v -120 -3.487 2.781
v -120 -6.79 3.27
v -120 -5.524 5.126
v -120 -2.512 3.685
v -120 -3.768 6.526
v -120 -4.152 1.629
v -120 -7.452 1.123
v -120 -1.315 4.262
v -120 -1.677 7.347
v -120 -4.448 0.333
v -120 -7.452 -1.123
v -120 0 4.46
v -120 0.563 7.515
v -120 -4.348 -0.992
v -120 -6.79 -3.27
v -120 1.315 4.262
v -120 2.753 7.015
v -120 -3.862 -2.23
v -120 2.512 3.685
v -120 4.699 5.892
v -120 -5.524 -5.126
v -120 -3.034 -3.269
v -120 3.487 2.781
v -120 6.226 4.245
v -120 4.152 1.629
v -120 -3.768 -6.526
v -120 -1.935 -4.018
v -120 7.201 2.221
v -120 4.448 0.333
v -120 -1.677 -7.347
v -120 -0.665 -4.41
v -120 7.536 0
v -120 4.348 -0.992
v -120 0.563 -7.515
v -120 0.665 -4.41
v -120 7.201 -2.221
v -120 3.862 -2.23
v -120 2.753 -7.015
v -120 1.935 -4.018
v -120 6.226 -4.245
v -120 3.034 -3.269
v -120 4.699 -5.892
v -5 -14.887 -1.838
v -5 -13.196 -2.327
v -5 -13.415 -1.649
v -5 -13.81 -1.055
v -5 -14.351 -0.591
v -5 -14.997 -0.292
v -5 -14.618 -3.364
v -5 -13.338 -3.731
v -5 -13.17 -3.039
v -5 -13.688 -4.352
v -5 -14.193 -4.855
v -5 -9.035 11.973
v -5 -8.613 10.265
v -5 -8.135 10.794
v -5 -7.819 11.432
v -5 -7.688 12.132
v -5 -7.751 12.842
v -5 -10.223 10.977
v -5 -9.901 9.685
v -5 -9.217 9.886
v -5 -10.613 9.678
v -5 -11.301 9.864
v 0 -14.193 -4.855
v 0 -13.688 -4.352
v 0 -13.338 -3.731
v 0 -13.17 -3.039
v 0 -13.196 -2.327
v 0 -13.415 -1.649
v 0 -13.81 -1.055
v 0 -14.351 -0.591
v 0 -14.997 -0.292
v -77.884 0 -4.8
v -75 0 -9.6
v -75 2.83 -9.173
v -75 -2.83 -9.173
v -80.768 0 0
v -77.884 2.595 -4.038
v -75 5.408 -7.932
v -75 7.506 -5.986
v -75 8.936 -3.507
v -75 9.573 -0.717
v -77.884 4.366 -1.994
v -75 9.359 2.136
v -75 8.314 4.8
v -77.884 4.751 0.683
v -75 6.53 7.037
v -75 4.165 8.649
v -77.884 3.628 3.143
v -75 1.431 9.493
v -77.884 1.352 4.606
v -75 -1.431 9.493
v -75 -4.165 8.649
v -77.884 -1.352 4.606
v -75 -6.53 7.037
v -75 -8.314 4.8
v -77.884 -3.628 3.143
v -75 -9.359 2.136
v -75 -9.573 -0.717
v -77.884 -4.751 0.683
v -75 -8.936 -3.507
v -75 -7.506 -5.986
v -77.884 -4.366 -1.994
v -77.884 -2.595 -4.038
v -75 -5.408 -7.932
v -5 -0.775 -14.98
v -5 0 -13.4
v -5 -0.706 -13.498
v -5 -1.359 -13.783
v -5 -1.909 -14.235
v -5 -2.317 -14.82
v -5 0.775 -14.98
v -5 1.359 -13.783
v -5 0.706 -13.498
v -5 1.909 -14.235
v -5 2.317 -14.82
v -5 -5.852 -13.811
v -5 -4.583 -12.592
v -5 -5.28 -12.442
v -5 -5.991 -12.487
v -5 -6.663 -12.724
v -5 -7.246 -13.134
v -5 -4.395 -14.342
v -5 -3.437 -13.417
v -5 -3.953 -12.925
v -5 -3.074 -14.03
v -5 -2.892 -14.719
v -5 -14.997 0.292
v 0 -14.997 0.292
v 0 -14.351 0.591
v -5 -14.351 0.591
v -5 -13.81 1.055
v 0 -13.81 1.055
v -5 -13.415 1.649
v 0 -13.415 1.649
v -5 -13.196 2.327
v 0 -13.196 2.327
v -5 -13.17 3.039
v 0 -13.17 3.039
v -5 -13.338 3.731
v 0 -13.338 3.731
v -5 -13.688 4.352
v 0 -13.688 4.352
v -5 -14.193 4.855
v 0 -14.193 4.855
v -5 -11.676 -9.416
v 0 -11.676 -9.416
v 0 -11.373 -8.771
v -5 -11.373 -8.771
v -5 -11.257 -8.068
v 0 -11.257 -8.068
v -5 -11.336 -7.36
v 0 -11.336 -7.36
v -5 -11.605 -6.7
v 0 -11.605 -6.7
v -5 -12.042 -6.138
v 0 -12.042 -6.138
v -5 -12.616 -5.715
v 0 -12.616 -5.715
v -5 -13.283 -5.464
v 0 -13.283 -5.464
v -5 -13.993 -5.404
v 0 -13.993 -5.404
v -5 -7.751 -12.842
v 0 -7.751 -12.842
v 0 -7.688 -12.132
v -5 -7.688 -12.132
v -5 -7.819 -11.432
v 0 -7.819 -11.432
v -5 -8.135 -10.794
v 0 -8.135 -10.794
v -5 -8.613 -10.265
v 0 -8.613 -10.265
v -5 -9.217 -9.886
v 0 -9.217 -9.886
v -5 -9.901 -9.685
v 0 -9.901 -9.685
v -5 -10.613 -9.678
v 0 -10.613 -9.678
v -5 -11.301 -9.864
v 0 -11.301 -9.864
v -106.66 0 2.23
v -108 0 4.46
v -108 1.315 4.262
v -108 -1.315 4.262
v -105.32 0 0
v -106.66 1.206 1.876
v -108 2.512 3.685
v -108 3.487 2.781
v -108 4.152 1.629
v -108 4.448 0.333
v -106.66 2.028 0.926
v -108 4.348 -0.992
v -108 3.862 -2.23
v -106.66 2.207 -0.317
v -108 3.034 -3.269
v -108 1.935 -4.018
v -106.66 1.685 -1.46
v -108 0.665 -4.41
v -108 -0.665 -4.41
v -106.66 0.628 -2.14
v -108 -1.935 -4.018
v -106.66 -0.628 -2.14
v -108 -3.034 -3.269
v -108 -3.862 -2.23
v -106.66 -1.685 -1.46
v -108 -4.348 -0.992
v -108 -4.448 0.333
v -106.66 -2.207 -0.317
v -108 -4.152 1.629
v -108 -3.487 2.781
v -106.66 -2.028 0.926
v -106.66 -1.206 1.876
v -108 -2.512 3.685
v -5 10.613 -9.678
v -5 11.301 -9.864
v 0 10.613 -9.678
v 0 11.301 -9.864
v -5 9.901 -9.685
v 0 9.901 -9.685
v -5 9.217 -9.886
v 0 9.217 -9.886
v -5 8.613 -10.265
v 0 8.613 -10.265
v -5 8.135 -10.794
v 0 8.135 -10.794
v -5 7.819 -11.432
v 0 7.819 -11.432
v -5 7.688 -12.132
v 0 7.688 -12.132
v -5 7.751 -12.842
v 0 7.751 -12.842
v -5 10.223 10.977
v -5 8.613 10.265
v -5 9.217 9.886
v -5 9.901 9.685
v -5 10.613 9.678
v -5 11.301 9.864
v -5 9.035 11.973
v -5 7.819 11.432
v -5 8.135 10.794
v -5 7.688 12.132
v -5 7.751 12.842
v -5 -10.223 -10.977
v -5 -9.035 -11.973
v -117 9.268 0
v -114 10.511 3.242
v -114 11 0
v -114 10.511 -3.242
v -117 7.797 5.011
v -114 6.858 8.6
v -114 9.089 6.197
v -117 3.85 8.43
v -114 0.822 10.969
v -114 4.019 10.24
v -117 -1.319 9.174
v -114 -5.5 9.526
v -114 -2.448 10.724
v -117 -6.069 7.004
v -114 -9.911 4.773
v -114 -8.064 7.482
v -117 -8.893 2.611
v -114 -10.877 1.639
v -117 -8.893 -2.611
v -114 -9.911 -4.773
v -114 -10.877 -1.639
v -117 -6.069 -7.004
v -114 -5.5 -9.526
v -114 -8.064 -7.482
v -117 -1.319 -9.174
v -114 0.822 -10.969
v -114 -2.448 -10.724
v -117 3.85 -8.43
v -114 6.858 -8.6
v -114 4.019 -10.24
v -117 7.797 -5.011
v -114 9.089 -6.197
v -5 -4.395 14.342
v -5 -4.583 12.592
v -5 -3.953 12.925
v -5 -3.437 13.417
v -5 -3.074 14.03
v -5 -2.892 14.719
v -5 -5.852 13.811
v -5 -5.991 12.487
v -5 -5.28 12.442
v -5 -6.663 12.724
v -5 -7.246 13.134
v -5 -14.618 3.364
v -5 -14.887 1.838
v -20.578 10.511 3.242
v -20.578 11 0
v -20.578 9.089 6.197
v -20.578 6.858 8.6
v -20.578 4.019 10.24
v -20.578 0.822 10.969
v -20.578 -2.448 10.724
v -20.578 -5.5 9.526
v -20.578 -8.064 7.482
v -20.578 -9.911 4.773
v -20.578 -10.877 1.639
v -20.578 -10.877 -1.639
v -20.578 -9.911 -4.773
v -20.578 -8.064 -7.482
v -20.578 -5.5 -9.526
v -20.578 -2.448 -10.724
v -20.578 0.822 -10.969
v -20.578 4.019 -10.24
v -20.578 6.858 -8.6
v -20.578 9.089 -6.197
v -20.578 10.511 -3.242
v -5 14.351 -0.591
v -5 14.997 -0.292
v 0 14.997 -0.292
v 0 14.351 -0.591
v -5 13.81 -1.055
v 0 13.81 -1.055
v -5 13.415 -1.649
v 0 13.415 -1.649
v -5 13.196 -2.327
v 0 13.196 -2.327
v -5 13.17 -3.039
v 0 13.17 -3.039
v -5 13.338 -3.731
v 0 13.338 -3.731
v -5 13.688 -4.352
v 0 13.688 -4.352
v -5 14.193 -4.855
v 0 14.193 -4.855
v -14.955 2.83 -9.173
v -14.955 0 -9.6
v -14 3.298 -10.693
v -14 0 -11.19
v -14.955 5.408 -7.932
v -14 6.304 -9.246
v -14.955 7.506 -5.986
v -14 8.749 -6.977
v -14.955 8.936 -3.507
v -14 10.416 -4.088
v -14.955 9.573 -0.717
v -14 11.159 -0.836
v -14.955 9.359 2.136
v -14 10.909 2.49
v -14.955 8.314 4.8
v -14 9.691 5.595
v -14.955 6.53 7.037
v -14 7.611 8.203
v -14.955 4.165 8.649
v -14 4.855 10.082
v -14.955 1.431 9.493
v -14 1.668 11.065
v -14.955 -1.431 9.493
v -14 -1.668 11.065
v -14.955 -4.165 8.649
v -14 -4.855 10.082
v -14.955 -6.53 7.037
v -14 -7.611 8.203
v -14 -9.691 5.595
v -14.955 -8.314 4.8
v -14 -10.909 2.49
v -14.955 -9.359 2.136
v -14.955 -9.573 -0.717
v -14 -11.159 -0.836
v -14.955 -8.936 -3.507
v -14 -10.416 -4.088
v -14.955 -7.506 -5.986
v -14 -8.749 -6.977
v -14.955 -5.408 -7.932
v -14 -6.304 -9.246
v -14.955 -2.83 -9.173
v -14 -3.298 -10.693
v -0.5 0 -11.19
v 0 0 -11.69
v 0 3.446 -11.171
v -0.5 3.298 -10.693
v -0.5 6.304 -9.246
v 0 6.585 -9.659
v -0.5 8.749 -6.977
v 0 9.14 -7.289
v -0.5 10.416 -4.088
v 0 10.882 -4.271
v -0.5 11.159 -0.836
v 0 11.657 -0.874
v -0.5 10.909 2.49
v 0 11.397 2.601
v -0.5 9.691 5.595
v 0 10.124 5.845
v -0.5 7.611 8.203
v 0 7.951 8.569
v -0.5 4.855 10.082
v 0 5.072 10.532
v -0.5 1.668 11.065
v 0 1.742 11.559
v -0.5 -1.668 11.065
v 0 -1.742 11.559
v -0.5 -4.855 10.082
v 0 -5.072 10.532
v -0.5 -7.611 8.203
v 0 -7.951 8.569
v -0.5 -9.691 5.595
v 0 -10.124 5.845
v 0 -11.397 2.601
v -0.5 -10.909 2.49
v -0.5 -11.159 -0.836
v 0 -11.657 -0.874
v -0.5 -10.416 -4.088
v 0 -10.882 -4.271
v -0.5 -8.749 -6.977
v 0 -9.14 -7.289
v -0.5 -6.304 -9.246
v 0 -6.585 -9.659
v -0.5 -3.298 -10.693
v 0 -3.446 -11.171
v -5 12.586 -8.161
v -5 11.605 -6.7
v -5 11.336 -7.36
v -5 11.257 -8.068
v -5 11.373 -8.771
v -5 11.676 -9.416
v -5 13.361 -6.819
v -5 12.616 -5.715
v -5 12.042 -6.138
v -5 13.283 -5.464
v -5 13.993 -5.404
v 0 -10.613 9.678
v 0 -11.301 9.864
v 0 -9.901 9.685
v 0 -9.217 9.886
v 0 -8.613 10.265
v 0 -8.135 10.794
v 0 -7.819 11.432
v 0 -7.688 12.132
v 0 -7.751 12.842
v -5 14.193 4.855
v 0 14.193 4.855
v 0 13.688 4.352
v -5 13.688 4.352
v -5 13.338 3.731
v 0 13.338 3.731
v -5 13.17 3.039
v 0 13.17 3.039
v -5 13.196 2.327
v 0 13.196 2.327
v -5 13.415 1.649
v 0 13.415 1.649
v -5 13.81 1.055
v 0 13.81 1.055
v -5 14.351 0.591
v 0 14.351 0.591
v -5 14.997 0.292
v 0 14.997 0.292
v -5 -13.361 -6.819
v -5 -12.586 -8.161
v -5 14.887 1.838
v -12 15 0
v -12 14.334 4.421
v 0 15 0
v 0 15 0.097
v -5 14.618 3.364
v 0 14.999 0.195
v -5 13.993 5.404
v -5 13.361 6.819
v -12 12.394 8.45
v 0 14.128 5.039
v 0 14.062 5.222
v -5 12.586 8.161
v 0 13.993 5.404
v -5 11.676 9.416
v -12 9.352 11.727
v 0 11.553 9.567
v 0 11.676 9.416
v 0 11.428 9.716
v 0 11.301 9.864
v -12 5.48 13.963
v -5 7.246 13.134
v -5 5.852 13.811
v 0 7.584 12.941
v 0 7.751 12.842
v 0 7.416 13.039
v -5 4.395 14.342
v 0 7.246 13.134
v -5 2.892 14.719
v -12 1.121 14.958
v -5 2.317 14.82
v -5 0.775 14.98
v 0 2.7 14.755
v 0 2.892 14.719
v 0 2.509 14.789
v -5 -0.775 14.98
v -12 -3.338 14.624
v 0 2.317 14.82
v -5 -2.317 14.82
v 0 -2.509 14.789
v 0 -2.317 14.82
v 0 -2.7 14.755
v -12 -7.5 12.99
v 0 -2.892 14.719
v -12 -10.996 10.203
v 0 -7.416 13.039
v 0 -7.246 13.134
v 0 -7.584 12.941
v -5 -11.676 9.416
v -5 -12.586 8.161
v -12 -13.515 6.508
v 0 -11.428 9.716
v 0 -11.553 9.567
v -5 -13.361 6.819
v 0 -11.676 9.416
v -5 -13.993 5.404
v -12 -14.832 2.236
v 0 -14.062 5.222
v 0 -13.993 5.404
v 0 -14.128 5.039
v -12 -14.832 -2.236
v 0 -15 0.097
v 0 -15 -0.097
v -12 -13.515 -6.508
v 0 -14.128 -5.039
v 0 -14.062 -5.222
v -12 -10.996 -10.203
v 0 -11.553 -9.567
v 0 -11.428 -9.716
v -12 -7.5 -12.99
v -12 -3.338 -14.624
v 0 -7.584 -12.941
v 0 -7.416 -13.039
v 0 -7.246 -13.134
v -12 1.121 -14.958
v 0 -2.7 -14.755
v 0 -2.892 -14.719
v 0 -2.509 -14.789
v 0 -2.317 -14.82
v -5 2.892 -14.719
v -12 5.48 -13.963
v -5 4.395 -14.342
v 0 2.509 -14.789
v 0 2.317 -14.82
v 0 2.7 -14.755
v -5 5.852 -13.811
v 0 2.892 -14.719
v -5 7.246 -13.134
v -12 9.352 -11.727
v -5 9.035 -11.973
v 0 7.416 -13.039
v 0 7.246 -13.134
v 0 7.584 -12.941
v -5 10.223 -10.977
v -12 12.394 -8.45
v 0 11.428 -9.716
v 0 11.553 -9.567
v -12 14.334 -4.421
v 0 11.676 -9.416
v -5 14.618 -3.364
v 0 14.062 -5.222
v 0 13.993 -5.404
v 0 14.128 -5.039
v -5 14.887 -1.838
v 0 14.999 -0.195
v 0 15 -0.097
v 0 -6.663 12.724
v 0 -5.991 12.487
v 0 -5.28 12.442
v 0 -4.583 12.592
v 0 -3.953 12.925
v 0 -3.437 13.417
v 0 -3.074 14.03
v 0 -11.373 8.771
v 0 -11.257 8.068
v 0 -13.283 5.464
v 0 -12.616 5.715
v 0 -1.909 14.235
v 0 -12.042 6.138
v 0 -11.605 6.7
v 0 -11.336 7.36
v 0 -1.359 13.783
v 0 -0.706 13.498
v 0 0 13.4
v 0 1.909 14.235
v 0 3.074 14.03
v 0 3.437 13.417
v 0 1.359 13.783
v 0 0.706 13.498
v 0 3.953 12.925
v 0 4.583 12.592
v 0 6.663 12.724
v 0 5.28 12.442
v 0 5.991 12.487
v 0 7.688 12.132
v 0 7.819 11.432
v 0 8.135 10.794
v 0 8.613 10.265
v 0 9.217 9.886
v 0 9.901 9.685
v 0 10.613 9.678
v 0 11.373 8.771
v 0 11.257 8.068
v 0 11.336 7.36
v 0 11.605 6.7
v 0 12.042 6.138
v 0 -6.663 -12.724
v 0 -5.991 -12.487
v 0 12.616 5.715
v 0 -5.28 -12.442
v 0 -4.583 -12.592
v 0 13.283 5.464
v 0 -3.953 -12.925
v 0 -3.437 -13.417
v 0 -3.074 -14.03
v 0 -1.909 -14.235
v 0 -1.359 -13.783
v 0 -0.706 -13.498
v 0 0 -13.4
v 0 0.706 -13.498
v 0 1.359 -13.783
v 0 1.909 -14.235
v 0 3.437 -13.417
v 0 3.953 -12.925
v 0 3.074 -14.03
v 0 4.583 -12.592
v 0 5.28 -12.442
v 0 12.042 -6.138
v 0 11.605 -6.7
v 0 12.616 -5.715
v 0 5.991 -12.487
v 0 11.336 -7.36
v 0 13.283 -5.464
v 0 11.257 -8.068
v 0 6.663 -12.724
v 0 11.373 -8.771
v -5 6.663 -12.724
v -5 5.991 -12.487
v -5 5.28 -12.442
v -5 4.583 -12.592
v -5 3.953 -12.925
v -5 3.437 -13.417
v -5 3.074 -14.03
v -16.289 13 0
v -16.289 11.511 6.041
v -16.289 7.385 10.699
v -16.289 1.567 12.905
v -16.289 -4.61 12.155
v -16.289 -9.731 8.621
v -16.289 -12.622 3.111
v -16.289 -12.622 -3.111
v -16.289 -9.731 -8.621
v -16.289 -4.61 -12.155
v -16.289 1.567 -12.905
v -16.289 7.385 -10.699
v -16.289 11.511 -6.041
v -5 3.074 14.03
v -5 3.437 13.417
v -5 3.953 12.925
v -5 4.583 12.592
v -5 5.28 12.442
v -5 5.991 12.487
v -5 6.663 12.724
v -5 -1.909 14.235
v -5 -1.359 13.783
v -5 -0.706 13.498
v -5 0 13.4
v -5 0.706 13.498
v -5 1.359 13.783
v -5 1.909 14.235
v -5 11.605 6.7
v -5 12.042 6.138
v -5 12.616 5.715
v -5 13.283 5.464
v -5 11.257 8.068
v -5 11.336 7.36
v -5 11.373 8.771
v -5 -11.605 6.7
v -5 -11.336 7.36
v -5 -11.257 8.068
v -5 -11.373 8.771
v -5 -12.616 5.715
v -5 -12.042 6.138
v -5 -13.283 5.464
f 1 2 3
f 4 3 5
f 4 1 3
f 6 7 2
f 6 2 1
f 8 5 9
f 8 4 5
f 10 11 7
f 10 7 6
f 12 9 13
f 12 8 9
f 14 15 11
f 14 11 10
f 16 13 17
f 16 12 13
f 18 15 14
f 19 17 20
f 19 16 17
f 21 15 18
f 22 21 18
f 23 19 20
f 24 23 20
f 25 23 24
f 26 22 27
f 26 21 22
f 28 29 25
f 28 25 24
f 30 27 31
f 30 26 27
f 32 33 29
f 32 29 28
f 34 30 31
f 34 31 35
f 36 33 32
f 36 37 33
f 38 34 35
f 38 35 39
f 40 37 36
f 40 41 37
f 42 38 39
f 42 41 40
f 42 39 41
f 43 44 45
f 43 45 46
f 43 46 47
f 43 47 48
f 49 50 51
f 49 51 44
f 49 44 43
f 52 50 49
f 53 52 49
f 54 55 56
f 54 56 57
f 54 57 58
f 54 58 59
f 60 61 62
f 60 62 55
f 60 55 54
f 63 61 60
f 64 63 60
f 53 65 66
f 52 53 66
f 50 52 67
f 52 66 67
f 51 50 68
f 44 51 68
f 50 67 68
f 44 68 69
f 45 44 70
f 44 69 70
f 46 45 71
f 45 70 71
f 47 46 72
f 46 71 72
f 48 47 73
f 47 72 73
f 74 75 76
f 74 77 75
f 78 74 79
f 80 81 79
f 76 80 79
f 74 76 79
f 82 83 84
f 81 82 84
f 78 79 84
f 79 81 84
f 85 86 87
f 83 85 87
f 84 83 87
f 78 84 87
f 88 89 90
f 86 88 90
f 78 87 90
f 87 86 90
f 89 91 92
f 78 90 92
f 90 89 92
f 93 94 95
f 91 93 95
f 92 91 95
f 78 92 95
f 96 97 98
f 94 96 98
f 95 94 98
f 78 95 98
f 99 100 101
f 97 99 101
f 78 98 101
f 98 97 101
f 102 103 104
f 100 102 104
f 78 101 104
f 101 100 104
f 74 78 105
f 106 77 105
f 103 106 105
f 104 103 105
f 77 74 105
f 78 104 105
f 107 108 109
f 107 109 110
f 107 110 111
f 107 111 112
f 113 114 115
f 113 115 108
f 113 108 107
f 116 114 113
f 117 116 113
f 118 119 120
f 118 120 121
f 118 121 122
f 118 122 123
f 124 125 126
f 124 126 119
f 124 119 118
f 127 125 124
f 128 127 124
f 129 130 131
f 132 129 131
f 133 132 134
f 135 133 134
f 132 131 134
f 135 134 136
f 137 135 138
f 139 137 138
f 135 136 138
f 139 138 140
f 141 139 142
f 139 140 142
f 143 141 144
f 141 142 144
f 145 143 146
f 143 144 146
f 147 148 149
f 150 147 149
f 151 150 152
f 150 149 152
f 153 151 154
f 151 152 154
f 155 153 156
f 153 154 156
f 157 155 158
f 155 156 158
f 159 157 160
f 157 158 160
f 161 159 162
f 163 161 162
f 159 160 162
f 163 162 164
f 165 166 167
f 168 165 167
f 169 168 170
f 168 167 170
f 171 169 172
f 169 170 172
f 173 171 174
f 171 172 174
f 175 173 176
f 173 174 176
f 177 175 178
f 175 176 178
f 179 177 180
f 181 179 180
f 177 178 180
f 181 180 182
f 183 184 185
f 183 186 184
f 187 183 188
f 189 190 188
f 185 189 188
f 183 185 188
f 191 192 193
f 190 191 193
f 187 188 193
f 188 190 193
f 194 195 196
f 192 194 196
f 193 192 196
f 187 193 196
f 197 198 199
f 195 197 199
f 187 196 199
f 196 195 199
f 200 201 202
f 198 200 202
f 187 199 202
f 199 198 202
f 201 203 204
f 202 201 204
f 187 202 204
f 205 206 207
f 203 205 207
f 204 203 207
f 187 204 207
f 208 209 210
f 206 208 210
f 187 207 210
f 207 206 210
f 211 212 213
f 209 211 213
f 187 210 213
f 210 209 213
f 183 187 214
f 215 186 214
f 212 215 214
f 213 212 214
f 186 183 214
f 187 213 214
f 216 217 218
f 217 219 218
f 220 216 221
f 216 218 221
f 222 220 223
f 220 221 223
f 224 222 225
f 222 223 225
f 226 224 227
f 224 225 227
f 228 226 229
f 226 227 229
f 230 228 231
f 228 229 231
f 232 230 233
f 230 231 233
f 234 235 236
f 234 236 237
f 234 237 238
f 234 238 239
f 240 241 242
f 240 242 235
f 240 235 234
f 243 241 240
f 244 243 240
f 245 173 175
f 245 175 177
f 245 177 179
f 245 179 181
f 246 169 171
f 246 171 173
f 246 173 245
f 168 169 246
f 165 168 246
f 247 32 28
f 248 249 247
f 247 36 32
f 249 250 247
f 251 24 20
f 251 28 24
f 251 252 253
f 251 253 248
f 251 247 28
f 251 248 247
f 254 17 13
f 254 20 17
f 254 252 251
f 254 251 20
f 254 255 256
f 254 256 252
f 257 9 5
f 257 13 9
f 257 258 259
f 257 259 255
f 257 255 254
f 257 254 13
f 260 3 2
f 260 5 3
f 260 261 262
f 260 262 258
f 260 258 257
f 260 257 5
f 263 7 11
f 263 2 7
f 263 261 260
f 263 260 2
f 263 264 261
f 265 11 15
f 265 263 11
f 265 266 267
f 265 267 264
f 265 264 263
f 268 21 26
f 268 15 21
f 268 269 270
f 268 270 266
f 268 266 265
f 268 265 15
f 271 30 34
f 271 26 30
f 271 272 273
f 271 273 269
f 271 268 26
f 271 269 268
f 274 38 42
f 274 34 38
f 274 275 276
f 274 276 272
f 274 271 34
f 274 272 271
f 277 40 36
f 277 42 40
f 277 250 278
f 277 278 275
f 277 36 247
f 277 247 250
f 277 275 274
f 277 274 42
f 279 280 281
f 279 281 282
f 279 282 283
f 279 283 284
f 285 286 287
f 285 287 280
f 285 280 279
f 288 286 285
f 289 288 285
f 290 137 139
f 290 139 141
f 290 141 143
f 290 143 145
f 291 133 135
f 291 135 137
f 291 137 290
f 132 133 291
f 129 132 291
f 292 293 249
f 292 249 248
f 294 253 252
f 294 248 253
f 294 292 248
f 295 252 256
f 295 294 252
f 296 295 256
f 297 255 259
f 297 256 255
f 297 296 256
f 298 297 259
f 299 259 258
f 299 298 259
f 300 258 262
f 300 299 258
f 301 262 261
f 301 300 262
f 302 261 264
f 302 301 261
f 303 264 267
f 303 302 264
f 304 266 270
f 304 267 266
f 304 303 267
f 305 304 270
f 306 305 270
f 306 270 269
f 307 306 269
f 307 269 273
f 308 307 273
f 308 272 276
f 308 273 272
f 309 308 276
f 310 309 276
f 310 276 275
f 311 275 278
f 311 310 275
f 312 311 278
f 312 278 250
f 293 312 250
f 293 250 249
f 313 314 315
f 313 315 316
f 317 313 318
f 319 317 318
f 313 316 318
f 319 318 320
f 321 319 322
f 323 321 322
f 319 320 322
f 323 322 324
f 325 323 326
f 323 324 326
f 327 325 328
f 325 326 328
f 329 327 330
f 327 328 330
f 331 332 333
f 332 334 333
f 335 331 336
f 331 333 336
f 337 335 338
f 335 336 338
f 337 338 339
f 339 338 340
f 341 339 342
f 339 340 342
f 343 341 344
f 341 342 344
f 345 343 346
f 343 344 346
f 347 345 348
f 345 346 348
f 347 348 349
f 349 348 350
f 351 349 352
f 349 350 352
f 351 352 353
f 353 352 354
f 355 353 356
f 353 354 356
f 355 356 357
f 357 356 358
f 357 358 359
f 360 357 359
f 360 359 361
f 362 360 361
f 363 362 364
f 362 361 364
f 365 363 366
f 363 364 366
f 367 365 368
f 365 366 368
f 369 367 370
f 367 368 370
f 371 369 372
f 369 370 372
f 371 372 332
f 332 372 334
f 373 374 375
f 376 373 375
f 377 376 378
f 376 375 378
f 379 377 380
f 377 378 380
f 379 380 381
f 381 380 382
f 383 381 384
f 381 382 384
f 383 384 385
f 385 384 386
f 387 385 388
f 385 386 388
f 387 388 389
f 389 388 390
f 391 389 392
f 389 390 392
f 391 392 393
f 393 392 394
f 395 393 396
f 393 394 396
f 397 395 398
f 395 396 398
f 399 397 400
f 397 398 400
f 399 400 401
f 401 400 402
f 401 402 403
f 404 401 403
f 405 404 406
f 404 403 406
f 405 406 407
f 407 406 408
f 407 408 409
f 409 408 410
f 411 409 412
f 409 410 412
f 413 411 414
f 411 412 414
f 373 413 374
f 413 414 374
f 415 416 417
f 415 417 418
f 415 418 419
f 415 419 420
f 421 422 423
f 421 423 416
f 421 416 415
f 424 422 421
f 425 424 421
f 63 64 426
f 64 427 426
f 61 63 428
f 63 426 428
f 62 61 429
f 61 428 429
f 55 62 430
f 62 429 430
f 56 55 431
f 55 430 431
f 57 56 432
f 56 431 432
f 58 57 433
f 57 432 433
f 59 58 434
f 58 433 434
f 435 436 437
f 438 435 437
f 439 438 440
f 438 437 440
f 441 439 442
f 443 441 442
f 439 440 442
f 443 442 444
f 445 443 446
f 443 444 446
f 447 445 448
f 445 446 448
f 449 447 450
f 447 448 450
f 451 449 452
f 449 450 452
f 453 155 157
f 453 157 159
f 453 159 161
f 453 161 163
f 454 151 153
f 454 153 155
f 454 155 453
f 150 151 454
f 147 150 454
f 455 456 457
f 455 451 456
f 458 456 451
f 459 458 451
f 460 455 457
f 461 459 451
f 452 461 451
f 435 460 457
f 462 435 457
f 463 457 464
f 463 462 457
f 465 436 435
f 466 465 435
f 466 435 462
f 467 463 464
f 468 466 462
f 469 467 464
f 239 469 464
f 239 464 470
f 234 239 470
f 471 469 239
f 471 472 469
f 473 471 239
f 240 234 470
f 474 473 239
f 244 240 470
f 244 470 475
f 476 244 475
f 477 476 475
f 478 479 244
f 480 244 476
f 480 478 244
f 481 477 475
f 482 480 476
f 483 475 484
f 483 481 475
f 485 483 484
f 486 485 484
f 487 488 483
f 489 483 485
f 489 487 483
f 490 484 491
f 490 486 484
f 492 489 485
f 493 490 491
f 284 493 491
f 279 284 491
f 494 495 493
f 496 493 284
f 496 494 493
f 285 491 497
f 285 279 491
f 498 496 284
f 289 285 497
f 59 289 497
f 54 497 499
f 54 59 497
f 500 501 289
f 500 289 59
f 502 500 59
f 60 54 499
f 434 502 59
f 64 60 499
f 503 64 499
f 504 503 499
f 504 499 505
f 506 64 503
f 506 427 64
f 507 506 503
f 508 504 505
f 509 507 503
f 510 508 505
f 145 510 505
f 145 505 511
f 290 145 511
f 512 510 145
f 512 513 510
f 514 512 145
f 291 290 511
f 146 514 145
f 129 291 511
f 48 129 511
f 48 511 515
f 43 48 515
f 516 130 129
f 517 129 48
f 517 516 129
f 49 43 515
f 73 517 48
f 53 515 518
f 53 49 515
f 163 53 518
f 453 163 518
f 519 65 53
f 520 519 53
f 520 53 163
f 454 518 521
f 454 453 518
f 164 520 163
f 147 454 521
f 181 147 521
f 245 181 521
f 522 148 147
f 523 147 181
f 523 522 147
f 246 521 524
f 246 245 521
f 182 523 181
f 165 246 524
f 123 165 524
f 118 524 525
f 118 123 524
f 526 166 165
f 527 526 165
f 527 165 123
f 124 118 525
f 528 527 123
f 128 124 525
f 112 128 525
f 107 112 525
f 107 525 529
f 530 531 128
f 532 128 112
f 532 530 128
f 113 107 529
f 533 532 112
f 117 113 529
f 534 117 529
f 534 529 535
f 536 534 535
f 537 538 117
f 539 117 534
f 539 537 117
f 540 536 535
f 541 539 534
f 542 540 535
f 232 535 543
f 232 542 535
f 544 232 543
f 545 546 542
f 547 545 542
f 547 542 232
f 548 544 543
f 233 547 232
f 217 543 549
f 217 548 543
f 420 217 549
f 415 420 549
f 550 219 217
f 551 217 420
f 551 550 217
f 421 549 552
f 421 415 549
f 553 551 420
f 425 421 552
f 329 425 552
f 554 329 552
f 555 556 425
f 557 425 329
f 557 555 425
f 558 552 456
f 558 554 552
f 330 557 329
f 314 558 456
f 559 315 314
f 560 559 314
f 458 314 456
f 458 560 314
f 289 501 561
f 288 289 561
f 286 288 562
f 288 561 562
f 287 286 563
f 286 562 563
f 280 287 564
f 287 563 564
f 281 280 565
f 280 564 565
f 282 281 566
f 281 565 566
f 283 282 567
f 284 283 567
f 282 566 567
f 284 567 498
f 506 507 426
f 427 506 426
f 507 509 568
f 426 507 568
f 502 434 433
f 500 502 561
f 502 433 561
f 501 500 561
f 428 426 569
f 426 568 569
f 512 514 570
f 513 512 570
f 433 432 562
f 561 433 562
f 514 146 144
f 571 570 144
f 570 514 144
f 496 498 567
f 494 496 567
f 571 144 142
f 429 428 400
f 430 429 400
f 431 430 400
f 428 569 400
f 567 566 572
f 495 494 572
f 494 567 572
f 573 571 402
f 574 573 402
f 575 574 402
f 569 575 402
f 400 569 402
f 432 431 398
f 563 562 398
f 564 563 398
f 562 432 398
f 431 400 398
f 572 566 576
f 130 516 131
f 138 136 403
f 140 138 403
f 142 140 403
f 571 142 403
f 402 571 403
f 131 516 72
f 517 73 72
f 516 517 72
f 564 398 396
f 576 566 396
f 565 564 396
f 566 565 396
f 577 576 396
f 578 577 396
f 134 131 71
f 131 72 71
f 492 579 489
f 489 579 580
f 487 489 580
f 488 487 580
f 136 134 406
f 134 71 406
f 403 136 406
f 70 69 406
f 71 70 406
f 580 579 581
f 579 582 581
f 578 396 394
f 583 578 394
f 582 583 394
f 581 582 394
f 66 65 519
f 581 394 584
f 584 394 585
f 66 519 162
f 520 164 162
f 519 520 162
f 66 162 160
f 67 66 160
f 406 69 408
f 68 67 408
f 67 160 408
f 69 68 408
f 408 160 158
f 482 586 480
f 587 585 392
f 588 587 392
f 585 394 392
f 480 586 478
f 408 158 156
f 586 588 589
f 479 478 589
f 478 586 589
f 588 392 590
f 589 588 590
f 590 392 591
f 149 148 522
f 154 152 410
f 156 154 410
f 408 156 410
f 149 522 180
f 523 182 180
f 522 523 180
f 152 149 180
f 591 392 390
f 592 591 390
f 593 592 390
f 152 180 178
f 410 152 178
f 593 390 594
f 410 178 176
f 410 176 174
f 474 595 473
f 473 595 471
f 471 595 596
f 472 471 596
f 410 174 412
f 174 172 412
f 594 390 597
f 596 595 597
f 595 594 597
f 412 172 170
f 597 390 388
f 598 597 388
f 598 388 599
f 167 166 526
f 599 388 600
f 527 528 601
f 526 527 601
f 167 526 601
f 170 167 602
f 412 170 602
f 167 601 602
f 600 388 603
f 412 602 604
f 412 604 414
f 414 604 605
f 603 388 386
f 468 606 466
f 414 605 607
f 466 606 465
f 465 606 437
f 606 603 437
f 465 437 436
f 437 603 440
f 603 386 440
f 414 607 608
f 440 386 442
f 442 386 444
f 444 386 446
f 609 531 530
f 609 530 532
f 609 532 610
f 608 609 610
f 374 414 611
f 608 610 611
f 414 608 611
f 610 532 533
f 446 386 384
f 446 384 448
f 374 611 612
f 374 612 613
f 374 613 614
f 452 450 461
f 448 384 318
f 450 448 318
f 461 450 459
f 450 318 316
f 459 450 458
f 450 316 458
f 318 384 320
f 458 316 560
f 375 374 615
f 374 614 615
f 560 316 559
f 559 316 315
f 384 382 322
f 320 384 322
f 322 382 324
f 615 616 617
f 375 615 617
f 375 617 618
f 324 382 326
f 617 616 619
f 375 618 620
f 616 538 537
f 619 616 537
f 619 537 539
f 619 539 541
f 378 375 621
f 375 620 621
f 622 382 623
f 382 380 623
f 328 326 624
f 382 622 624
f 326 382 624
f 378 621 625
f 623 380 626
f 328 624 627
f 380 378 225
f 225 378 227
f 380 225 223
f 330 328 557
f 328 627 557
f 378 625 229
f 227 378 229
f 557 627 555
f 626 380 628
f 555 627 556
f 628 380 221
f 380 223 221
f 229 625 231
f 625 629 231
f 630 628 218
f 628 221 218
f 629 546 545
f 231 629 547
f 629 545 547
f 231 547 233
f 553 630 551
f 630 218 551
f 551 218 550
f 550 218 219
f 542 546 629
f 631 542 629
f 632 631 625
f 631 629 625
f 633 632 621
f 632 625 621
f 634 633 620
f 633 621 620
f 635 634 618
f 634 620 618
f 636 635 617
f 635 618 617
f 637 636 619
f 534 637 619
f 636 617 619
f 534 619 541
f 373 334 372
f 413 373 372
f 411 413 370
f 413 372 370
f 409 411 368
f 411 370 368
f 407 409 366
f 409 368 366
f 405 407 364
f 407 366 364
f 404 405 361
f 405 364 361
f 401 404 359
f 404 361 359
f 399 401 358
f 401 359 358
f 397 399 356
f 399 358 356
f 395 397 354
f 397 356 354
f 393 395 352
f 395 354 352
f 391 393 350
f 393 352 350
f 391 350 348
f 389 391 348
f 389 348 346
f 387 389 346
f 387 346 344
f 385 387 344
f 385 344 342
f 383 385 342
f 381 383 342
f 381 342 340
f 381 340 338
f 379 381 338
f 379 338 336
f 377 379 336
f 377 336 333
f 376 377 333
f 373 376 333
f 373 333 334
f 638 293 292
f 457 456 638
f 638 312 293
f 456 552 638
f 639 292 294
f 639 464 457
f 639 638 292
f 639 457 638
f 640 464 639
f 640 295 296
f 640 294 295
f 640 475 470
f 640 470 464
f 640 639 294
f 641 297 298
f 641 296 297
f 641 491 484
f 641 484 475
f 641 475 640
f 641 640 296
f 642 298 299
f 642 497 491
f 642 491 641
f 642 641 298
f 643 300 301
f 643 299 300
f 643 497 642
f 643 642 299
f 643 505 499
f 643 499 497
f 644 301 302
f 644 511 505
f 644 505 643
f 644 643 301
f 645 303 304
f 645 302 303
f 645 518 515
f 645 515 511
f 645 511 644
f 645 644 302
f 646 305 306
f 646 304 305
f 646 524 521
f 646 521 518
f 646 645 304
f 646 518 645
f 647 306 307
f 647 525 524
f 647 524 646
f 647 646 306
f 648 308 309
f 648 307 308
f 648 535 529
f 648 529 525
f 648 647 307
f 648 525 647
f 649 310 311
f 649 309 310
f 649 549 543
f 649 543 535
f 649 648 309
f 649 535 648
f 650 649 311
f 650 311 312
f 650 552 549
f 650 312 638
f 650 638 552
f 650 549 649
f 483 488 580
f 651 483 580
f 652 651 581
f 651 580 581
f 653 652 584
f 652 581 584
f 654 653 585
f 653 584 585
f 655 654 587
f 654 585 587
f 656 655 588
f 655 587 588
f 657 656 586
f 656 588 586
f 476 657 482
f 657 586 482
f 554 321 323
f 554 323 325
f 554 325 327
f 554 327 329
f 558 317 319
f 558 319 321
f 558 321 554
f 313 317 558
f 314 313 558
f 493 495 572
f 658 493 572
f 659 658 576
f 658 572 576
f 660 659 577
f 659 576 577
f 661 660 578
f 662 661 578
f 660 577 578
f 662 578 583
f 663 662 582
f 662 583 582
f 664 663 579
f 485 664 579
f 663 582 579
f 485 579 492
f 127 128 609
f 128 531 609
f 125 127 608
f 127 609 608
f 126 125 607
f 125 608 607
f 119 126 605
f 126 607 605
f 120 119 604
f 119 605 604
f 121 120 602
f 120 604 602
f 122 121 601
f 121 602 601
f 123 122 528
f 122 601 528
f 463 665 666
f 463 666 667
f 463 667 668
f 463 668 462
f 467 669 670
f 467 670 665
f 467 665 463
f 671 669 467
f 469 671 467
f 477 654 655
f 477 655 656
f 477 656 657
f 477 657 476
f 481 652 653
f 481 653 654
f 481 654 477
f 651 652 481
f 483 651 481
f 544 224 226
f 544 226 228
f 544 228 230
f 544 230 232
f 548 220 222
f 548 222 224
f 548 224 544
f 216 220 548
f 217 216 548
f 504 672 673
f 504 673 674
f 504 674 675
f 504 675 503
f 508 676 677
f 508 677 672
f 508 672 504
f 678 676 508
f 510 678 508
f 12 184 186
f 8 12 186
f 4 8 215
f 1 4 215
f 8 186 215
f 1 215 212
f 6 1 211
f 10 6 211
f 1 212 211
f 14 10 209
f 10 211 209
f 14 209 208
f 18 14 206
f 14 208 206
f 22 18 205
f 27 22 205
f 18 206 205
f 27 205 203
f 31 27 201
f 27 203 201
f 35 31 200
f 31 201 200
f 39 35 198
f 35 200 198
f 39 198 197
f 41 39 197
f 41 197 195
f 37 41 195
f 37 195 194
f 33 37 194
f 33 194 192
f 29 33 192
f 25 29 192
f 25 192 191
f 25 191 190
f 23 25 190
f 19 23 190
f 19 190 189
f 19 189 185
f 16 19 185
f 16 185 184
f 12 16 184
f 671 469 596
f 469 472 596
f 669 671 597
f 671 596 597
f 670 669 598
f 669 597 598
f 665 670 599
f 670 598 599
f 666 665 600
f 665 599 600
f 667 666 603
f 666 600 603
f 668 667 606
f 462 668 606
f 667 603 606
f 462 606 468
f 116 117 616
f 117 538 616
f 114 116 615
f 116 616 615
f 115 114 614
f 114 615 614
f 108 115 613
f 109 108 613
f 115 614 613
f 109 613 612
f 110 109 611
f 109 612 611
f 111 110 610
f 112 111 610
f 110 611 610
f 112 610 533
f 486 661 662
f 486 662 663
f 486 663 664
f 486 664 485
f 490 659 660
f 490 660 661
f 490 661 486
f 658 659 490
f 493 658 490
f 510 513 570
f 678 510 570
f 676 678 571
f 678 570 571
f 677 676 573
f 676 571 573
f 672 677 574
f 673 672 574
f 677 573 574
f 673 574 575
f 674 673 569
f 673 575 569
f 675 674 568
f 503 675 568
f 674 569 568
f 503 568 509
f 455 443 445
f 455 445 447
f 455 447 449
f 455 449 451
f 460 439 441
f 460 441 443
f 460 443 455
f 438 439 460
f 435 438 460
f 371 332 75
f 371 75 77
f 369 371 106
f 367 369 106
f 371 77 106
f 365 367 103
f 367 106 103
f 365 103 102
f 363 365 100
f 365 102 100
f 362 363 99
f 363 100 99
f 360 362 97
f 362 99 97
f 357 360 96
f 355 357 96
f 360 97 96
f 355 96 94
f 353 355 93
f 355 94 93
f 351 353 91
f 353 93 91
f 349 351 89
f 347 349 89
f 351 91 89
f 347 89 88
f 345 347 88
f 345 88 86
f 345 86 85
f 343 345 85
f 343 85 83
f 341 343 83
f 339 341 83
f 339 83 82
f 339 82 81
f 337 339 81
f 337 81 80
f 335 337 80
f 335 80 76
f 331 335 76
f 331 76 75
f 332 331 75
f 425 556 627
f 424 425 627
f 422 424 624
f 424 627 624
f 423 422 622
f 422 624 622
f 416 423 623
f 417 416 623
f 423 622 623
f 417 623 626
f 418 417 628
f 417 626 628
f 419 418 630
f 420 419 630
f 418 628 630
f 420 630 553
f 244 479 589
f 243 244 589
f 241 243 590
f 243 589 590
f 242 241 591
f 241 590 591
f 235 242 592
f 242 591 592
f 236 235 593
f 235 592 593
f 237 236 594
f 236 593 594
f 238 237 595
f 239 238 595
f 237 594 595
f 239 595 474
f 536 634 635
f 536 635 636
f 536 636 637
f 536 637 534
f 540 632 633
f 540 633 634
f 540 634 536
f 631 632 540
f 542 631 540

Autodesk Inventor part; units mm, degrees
ref_plane "YZ Plane" through (0, 0, 0) normal (1, 0, 0) x (0, 1, 0)
ref_plane "XZ Plane" through (0, 0, 0) normal (0, 1, 0) x (-1, 0, 0)
ref_plane "XY Plane" through (0, 0, 0) normal (0, 0, 1) x (1, 0, 0)
sketch "Náčrt1" plane through (0, 0, 0) normal (0, 0, 1) x (1, 0, 0)
  line L0 (0, 0) -> (-120, 0)
  line L1 (-120, 0) -> (-120, 11)
  line L2 (-120, 11) -> (-20.578, 11)
  line L3 (-20.578, 11) -> (-12, 15)
  line L4 (-12, 15) -> (0, 15)
  line L5 (0, 15) -> (0, 0)
  dimension "d2" = 22
  dimension "d3" = 30
  dimension "d4" = 12
  dimension "d5" = 25
  dimension "d6" = 120
revolve "Rotace1" add sketch "Náčrt1" angle 360 about axis through (0, 0, 0) along (-1, 0, 0)
hole "Díra1" at (0, 0, 0) direction (-1, 0, 0) diameter 22.38 depth 14 tip angle 118
hole "Díra2" at (0, 0, 0) direction (-1, 0, 0) diameter 19.2 depth 75 tip angle 118
hole "Díra3" at (-120, 0, 0) direction (1, 0, 0) diameter 8.92 depth 12 tip angle 118
chamfer "Zkosení1" distance 6 angle 30 1 edges at (-120, -11, 0) measured on face at (-53.7187, 10.8576, 1.7645)
sketch "Náčrt2" plane through (0, 0, 0) normal (1, 0, 0) x (0, 0, -1)
  circle A0 centre (16, 0) radius 2.6
  point P0 (0, 0)
  dimension "d40" = 16
  dimension "d41" = 5.2
extrude "Vysunutí1" cut sketch "Náčrt2" against normal blind 5
pattern_circular "Kruhové pole1" count 18 over 360 about axis through (-6, 0, 0) along (1, 0, 0) of "Vysunutí1"
chamfer "Zkosení2" distance 0.5 angle 45 1 edges at (0, 0, 11.19)
properties part number "Head03" material "ETG 100"
